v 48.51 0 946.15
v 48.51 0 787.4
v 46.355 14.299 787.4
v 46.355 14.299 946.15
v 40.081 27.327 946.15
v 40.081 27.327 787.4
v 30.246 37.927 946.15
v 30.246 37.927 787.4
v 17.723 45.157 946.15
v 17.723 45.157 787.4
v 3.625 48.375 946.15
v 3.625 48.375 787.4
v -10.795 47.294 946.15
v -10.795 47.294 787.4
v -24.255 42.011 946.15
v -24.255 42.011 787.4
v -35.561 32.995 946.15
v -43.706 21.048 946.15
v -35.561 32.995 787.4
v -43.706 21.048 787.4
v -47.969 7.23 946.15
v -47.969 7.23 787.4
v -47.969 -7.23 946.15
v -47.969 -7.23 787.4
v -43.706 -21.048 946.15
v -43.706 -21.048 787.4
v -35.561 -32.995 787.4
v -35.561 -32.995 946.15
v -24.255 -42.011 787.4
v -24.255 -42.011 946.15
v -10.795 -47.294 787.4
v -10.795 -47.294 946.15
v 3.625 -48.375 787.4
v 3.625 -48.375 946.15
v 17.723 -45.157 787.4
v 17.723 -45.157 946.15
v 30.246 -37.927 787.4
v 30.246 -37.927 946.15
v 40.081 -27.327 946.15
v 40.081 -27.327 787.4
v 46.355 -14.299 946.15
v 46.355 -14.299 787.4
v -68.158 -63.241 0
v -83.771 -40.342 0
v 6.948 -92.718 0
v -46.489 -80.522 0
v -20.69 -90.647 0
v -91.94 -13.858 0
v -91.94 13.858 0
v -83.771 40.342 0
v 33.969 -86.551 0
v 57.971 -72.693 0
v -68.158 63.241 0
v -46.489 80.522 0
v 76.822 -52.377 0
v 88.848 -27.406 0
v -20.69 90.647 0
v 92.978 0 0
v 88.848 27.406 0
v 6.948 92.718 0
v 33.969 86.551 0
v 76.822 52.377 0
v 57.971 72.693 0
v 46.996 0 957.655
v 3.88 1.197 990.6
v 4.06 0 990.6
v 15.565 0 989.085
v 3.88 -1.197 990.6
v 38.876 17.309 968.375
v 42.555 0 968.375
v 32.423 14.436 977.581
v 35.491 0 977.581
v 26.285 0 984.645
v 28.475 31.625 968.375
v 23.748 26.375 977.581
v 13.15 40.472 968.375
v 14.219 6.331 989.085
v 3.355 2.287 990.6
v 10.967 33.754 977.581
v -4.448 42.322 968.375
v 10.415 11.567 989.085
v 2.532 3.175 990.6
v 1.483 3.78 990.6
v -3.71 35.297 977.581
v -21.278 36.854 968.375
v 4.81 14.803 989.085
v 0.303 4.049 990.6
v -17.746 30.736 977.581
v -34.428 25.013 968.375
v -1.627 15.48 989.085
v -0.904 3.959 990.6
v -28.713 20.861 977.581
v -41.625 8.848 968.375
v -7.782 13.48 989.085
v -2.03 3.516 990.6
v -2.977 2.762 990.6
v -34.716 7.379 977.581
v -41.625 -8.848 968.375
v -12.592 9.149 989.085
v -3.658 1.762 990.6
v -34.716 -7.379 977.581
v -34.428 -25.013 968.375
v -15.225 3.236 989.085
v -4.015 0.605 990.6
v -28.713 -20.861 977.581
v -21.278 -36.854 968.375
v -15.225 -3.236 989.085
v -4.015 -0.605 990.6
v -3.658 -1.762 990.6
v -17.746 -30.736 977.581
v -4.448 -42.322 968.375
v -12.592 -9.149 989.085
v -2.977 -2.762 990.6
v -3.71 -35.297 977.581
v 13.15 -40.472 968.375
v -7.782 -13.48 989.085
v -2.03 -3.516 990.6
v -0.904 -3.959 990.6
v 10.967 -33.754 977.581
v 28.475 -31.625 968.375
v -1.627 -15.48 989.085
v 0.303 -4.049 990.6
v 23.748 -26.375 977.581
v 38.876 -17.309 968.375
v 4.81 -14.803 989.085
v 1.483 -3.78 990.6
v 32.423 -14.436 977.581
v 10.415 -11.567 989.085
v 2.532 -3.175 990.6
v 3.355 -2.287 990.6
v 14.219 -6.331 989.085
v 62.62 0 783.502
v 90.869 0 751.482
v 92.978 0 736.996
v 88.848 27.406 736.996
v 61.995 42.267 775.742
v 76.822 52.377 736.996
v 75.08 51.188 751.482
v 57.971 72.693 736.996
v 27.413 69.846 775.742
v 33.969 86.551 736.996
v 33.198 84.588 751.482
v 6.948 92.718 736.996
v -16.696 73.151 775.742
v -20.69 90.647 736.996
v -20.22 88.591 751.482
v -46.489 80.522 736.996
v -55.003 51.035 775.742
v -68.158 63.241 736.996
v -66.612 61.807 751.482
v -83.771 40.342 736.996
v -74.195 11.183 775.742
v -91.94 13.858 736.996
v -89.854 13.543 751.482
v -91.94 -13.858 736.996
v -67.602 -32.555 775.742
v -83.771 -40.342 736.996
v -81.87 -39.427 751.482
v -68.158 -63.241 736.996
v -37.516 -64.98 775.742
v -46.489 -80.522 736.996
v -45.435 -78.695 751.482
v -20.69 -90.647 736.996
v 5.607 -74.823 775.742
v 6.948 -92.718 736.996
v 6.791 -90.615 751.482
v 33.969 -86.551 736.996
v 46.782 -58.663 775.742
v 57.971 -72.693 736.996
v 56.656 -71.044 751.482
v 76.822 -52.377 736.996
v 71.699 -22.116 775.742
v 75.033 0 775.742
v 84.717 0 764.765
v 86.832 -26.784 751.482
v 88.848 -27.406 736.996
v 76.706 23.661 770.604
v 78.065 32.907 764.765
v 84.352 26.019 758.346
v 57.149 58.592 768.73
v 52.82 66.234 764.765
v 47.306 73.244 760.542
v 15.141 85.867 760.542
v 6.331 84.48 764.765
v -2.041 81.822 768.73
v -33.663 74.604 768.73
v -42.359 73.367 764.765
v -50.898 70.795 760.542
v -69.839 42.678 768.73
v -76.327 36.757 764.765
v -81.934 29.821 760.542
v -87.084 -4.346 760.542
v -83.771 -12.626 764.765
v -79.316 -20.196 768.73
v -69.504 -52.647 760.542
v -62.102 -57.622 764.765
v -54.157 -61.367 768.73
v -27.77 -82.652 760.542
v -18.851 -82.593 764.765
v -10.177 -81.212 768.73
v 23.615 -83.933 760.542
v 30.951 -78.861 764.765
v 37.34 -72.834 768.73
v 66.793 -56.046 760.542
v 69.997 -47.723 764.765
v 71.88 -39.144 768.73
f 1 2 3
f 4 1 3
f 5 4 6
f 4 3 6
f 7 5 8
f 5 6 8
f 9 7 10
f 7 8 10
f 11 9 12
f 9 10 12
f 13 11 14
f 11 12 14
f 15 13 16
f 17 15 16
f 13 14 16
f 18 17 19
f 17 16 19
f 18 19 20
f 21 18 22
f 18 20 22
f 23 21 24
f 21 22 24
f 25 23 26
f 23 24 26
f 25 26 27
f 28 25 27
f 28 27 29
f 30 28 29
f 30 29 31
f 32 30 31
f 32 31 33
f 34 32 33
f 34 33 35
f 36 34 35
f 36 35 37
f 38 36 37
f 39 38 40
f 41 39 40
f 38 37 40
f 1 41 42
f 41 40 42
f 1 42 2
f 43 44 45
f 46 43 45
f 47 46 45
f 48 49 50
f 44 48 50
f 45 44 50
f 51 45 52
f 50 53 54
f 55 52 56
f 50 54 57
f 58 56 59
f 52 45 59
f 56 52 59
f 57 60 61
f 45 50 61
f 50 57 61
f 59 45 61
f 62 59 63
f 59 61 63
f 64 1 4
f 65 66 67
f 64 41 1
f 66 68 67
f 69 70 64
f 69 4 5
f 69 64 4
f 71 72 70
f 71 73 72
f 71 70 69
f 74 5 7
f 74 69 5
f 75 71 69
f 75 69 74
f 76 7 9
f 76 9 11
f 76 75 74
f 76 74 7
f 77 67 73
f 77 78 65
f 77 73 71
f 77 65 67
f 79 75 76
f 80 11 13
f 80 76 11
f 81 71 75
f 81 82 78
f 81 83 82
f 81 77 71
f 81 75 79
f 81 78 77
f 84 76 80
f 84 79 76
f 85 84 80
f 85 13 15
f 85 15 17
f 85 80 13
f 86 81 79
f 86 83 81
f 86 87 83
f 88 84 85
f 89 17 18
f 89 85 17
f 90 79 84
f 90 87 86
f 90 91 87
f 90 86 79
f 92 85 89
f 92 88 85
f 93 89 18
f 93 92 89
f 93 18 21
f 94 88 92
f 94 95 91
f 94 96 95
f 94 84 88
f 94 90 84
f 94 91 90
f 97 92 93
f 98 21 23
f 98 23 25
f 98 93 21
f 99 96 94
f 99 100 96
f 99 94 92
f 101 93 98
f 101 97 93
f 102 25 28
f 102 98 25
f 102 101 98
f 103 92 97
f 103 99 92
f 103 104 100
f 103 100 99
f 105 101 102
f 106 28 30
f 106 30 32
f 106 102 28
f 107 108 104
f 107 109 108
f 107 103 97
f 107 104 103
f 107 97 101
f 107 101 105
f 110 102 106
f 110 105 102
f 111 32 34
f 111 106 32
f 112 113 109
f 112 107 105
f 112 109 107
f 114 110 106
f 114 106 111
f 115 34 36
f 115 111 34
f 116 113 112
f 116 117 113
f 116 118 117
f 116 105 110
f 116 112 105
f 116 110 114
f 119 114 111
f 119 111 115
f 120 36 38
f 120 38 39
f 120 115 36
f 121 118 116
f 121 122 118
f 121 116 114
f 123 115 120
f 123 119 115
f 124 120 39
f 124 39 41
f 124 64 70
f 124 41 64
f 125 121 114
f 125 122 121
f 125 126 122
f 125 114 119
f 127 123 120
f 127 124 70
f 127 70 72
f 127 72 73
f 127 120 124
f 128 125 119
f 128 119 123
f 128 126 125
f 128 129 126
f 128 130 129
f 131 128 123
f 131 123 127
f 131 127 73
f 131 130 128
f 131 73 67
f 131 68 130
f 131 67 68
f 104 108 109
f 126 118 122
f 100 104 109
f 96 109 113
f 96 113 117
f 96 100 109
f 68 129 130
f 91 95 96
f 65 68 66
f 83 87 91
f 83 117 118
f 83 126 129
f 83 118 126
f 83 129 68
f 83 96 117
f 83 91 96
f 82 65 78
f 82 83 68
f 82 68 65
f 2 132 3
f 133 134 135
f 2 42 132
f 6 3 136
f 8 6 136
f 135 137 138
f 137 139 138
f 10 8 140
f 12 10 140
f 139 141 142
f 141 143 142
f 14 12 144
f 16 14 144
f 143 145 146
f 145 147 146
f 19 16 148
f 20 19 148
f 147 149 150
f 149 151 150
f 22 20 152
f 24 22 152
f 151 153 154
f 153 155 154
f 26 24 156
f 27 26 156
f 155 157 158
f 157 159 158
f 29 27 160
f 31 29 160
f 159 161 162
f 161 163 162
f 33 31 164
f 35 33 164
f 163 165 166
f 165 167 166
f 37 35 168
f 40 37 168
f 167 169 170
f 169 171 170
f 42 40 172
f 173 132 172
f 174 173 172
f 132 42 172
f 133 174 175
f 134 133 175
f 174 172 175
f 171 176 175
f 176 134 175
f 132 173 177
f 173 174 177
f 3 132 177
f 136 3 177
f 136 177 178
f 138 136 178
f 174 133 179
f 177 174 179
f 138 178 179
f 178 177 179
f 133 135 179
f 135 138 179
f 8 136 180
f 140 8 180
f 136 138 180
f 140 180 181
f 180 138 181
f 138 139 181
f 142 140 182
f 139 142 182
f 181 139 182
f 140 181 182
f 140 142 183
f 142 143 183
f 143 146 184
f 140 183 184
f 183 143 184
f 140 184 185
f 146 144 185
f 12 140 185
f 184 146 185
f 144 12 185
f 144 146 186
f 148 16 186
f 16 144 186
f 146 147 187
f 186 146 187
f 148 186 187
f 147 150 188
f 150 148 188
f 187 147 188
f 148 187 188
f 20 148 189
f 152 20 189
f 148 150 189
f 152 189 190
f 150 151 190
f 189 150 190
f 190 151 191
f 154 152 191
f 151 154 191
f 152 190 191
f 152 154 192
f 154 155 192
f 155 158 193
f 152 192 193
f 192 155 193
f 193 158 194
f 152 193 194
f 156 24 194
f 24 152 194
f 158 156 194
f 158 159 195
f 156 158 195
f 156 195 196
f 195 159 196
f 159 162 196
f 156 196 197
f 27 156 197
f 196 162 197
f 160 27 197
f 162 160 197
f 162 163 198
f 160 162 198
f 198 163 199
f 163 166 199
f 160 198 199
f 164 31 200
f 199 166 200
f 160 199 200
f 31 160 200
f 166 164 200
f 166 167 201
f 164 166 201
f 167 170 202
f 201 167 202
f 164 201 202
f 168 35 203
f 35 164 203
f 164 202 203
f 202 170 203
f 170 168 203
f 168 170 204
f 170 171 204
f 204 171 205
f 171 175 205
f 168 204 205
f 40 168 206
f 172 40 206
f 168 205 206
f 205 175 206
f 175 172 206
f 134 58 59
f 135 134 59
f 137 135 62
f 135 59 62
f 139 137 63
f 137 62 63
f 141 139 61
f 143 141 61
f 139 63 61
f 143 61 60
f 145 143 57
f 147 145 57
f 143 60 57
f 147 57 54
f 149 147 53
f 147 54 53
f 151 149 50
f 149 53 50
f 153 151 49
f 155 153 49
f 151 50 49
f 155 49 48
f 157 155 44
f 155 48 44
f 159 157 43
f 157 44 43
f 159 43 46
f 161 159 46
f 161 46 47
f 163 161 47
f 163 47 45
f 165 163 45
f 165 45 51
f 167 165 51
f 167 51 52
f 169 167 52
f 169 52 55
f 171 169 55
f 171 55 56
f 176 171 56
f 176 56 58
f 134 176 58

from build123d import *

# Parameters (mm, degrees)
F0_R     = 92.9783177543
F1_DEPTH = 787.4
F2_R     = 48.5104266544
F3_DEPTH = 203.2
F4_R     = 44.45


# Not quite as in the source:
# - a fillet or chamfer that OpenCascade refuses, or shapes differently, is made with other operations: its cross-section is extruded or revolved along the edge and cut away or added


with BuildPart() as f1:
    # F0 (on Top) → F1 (new body)
    with BuildSketch(Plane.XY):
        Circle(F0_R)
    extrude(amount=F1_DEPTH)

    # F2 (on face) → F3 (join)
    with BuildSketch(Plane.XY.offset(787.4)):
        Circle(F2_R)
    extrude(amount=F3_DEPTH)

    # F4
    f4_edges = [f1.edges().sort_by_distance(p)[0] for p in [
        (-48.510427, 0, 990.6),
    ]]
    fillet(f4_edges, radius=F4_R)

    # F5: fillet of radius 50.8 on 1 edges, made by hand

    # F5_s1 → F5_t2 (revolve, cut)
    with BuildSketch(Plane.XZ):
        with BuildLine():
            ThreePointArc((48.5104266544, 787.4), (80.2723535875, 770.6039898535), (92.9783177543, 736.9961866832))
            Line((92.9783177543, 736.9961866832), (92.9783177543, 787.4))
            Line((92.9783177543, 787.4), (48.5104266544, 787.4))
        make_face()
    revolve(axis=Axis((0, 0, 787.4), (0, 0, 1)), mode=Mode.SUBTRACT)


solid = f1.part
